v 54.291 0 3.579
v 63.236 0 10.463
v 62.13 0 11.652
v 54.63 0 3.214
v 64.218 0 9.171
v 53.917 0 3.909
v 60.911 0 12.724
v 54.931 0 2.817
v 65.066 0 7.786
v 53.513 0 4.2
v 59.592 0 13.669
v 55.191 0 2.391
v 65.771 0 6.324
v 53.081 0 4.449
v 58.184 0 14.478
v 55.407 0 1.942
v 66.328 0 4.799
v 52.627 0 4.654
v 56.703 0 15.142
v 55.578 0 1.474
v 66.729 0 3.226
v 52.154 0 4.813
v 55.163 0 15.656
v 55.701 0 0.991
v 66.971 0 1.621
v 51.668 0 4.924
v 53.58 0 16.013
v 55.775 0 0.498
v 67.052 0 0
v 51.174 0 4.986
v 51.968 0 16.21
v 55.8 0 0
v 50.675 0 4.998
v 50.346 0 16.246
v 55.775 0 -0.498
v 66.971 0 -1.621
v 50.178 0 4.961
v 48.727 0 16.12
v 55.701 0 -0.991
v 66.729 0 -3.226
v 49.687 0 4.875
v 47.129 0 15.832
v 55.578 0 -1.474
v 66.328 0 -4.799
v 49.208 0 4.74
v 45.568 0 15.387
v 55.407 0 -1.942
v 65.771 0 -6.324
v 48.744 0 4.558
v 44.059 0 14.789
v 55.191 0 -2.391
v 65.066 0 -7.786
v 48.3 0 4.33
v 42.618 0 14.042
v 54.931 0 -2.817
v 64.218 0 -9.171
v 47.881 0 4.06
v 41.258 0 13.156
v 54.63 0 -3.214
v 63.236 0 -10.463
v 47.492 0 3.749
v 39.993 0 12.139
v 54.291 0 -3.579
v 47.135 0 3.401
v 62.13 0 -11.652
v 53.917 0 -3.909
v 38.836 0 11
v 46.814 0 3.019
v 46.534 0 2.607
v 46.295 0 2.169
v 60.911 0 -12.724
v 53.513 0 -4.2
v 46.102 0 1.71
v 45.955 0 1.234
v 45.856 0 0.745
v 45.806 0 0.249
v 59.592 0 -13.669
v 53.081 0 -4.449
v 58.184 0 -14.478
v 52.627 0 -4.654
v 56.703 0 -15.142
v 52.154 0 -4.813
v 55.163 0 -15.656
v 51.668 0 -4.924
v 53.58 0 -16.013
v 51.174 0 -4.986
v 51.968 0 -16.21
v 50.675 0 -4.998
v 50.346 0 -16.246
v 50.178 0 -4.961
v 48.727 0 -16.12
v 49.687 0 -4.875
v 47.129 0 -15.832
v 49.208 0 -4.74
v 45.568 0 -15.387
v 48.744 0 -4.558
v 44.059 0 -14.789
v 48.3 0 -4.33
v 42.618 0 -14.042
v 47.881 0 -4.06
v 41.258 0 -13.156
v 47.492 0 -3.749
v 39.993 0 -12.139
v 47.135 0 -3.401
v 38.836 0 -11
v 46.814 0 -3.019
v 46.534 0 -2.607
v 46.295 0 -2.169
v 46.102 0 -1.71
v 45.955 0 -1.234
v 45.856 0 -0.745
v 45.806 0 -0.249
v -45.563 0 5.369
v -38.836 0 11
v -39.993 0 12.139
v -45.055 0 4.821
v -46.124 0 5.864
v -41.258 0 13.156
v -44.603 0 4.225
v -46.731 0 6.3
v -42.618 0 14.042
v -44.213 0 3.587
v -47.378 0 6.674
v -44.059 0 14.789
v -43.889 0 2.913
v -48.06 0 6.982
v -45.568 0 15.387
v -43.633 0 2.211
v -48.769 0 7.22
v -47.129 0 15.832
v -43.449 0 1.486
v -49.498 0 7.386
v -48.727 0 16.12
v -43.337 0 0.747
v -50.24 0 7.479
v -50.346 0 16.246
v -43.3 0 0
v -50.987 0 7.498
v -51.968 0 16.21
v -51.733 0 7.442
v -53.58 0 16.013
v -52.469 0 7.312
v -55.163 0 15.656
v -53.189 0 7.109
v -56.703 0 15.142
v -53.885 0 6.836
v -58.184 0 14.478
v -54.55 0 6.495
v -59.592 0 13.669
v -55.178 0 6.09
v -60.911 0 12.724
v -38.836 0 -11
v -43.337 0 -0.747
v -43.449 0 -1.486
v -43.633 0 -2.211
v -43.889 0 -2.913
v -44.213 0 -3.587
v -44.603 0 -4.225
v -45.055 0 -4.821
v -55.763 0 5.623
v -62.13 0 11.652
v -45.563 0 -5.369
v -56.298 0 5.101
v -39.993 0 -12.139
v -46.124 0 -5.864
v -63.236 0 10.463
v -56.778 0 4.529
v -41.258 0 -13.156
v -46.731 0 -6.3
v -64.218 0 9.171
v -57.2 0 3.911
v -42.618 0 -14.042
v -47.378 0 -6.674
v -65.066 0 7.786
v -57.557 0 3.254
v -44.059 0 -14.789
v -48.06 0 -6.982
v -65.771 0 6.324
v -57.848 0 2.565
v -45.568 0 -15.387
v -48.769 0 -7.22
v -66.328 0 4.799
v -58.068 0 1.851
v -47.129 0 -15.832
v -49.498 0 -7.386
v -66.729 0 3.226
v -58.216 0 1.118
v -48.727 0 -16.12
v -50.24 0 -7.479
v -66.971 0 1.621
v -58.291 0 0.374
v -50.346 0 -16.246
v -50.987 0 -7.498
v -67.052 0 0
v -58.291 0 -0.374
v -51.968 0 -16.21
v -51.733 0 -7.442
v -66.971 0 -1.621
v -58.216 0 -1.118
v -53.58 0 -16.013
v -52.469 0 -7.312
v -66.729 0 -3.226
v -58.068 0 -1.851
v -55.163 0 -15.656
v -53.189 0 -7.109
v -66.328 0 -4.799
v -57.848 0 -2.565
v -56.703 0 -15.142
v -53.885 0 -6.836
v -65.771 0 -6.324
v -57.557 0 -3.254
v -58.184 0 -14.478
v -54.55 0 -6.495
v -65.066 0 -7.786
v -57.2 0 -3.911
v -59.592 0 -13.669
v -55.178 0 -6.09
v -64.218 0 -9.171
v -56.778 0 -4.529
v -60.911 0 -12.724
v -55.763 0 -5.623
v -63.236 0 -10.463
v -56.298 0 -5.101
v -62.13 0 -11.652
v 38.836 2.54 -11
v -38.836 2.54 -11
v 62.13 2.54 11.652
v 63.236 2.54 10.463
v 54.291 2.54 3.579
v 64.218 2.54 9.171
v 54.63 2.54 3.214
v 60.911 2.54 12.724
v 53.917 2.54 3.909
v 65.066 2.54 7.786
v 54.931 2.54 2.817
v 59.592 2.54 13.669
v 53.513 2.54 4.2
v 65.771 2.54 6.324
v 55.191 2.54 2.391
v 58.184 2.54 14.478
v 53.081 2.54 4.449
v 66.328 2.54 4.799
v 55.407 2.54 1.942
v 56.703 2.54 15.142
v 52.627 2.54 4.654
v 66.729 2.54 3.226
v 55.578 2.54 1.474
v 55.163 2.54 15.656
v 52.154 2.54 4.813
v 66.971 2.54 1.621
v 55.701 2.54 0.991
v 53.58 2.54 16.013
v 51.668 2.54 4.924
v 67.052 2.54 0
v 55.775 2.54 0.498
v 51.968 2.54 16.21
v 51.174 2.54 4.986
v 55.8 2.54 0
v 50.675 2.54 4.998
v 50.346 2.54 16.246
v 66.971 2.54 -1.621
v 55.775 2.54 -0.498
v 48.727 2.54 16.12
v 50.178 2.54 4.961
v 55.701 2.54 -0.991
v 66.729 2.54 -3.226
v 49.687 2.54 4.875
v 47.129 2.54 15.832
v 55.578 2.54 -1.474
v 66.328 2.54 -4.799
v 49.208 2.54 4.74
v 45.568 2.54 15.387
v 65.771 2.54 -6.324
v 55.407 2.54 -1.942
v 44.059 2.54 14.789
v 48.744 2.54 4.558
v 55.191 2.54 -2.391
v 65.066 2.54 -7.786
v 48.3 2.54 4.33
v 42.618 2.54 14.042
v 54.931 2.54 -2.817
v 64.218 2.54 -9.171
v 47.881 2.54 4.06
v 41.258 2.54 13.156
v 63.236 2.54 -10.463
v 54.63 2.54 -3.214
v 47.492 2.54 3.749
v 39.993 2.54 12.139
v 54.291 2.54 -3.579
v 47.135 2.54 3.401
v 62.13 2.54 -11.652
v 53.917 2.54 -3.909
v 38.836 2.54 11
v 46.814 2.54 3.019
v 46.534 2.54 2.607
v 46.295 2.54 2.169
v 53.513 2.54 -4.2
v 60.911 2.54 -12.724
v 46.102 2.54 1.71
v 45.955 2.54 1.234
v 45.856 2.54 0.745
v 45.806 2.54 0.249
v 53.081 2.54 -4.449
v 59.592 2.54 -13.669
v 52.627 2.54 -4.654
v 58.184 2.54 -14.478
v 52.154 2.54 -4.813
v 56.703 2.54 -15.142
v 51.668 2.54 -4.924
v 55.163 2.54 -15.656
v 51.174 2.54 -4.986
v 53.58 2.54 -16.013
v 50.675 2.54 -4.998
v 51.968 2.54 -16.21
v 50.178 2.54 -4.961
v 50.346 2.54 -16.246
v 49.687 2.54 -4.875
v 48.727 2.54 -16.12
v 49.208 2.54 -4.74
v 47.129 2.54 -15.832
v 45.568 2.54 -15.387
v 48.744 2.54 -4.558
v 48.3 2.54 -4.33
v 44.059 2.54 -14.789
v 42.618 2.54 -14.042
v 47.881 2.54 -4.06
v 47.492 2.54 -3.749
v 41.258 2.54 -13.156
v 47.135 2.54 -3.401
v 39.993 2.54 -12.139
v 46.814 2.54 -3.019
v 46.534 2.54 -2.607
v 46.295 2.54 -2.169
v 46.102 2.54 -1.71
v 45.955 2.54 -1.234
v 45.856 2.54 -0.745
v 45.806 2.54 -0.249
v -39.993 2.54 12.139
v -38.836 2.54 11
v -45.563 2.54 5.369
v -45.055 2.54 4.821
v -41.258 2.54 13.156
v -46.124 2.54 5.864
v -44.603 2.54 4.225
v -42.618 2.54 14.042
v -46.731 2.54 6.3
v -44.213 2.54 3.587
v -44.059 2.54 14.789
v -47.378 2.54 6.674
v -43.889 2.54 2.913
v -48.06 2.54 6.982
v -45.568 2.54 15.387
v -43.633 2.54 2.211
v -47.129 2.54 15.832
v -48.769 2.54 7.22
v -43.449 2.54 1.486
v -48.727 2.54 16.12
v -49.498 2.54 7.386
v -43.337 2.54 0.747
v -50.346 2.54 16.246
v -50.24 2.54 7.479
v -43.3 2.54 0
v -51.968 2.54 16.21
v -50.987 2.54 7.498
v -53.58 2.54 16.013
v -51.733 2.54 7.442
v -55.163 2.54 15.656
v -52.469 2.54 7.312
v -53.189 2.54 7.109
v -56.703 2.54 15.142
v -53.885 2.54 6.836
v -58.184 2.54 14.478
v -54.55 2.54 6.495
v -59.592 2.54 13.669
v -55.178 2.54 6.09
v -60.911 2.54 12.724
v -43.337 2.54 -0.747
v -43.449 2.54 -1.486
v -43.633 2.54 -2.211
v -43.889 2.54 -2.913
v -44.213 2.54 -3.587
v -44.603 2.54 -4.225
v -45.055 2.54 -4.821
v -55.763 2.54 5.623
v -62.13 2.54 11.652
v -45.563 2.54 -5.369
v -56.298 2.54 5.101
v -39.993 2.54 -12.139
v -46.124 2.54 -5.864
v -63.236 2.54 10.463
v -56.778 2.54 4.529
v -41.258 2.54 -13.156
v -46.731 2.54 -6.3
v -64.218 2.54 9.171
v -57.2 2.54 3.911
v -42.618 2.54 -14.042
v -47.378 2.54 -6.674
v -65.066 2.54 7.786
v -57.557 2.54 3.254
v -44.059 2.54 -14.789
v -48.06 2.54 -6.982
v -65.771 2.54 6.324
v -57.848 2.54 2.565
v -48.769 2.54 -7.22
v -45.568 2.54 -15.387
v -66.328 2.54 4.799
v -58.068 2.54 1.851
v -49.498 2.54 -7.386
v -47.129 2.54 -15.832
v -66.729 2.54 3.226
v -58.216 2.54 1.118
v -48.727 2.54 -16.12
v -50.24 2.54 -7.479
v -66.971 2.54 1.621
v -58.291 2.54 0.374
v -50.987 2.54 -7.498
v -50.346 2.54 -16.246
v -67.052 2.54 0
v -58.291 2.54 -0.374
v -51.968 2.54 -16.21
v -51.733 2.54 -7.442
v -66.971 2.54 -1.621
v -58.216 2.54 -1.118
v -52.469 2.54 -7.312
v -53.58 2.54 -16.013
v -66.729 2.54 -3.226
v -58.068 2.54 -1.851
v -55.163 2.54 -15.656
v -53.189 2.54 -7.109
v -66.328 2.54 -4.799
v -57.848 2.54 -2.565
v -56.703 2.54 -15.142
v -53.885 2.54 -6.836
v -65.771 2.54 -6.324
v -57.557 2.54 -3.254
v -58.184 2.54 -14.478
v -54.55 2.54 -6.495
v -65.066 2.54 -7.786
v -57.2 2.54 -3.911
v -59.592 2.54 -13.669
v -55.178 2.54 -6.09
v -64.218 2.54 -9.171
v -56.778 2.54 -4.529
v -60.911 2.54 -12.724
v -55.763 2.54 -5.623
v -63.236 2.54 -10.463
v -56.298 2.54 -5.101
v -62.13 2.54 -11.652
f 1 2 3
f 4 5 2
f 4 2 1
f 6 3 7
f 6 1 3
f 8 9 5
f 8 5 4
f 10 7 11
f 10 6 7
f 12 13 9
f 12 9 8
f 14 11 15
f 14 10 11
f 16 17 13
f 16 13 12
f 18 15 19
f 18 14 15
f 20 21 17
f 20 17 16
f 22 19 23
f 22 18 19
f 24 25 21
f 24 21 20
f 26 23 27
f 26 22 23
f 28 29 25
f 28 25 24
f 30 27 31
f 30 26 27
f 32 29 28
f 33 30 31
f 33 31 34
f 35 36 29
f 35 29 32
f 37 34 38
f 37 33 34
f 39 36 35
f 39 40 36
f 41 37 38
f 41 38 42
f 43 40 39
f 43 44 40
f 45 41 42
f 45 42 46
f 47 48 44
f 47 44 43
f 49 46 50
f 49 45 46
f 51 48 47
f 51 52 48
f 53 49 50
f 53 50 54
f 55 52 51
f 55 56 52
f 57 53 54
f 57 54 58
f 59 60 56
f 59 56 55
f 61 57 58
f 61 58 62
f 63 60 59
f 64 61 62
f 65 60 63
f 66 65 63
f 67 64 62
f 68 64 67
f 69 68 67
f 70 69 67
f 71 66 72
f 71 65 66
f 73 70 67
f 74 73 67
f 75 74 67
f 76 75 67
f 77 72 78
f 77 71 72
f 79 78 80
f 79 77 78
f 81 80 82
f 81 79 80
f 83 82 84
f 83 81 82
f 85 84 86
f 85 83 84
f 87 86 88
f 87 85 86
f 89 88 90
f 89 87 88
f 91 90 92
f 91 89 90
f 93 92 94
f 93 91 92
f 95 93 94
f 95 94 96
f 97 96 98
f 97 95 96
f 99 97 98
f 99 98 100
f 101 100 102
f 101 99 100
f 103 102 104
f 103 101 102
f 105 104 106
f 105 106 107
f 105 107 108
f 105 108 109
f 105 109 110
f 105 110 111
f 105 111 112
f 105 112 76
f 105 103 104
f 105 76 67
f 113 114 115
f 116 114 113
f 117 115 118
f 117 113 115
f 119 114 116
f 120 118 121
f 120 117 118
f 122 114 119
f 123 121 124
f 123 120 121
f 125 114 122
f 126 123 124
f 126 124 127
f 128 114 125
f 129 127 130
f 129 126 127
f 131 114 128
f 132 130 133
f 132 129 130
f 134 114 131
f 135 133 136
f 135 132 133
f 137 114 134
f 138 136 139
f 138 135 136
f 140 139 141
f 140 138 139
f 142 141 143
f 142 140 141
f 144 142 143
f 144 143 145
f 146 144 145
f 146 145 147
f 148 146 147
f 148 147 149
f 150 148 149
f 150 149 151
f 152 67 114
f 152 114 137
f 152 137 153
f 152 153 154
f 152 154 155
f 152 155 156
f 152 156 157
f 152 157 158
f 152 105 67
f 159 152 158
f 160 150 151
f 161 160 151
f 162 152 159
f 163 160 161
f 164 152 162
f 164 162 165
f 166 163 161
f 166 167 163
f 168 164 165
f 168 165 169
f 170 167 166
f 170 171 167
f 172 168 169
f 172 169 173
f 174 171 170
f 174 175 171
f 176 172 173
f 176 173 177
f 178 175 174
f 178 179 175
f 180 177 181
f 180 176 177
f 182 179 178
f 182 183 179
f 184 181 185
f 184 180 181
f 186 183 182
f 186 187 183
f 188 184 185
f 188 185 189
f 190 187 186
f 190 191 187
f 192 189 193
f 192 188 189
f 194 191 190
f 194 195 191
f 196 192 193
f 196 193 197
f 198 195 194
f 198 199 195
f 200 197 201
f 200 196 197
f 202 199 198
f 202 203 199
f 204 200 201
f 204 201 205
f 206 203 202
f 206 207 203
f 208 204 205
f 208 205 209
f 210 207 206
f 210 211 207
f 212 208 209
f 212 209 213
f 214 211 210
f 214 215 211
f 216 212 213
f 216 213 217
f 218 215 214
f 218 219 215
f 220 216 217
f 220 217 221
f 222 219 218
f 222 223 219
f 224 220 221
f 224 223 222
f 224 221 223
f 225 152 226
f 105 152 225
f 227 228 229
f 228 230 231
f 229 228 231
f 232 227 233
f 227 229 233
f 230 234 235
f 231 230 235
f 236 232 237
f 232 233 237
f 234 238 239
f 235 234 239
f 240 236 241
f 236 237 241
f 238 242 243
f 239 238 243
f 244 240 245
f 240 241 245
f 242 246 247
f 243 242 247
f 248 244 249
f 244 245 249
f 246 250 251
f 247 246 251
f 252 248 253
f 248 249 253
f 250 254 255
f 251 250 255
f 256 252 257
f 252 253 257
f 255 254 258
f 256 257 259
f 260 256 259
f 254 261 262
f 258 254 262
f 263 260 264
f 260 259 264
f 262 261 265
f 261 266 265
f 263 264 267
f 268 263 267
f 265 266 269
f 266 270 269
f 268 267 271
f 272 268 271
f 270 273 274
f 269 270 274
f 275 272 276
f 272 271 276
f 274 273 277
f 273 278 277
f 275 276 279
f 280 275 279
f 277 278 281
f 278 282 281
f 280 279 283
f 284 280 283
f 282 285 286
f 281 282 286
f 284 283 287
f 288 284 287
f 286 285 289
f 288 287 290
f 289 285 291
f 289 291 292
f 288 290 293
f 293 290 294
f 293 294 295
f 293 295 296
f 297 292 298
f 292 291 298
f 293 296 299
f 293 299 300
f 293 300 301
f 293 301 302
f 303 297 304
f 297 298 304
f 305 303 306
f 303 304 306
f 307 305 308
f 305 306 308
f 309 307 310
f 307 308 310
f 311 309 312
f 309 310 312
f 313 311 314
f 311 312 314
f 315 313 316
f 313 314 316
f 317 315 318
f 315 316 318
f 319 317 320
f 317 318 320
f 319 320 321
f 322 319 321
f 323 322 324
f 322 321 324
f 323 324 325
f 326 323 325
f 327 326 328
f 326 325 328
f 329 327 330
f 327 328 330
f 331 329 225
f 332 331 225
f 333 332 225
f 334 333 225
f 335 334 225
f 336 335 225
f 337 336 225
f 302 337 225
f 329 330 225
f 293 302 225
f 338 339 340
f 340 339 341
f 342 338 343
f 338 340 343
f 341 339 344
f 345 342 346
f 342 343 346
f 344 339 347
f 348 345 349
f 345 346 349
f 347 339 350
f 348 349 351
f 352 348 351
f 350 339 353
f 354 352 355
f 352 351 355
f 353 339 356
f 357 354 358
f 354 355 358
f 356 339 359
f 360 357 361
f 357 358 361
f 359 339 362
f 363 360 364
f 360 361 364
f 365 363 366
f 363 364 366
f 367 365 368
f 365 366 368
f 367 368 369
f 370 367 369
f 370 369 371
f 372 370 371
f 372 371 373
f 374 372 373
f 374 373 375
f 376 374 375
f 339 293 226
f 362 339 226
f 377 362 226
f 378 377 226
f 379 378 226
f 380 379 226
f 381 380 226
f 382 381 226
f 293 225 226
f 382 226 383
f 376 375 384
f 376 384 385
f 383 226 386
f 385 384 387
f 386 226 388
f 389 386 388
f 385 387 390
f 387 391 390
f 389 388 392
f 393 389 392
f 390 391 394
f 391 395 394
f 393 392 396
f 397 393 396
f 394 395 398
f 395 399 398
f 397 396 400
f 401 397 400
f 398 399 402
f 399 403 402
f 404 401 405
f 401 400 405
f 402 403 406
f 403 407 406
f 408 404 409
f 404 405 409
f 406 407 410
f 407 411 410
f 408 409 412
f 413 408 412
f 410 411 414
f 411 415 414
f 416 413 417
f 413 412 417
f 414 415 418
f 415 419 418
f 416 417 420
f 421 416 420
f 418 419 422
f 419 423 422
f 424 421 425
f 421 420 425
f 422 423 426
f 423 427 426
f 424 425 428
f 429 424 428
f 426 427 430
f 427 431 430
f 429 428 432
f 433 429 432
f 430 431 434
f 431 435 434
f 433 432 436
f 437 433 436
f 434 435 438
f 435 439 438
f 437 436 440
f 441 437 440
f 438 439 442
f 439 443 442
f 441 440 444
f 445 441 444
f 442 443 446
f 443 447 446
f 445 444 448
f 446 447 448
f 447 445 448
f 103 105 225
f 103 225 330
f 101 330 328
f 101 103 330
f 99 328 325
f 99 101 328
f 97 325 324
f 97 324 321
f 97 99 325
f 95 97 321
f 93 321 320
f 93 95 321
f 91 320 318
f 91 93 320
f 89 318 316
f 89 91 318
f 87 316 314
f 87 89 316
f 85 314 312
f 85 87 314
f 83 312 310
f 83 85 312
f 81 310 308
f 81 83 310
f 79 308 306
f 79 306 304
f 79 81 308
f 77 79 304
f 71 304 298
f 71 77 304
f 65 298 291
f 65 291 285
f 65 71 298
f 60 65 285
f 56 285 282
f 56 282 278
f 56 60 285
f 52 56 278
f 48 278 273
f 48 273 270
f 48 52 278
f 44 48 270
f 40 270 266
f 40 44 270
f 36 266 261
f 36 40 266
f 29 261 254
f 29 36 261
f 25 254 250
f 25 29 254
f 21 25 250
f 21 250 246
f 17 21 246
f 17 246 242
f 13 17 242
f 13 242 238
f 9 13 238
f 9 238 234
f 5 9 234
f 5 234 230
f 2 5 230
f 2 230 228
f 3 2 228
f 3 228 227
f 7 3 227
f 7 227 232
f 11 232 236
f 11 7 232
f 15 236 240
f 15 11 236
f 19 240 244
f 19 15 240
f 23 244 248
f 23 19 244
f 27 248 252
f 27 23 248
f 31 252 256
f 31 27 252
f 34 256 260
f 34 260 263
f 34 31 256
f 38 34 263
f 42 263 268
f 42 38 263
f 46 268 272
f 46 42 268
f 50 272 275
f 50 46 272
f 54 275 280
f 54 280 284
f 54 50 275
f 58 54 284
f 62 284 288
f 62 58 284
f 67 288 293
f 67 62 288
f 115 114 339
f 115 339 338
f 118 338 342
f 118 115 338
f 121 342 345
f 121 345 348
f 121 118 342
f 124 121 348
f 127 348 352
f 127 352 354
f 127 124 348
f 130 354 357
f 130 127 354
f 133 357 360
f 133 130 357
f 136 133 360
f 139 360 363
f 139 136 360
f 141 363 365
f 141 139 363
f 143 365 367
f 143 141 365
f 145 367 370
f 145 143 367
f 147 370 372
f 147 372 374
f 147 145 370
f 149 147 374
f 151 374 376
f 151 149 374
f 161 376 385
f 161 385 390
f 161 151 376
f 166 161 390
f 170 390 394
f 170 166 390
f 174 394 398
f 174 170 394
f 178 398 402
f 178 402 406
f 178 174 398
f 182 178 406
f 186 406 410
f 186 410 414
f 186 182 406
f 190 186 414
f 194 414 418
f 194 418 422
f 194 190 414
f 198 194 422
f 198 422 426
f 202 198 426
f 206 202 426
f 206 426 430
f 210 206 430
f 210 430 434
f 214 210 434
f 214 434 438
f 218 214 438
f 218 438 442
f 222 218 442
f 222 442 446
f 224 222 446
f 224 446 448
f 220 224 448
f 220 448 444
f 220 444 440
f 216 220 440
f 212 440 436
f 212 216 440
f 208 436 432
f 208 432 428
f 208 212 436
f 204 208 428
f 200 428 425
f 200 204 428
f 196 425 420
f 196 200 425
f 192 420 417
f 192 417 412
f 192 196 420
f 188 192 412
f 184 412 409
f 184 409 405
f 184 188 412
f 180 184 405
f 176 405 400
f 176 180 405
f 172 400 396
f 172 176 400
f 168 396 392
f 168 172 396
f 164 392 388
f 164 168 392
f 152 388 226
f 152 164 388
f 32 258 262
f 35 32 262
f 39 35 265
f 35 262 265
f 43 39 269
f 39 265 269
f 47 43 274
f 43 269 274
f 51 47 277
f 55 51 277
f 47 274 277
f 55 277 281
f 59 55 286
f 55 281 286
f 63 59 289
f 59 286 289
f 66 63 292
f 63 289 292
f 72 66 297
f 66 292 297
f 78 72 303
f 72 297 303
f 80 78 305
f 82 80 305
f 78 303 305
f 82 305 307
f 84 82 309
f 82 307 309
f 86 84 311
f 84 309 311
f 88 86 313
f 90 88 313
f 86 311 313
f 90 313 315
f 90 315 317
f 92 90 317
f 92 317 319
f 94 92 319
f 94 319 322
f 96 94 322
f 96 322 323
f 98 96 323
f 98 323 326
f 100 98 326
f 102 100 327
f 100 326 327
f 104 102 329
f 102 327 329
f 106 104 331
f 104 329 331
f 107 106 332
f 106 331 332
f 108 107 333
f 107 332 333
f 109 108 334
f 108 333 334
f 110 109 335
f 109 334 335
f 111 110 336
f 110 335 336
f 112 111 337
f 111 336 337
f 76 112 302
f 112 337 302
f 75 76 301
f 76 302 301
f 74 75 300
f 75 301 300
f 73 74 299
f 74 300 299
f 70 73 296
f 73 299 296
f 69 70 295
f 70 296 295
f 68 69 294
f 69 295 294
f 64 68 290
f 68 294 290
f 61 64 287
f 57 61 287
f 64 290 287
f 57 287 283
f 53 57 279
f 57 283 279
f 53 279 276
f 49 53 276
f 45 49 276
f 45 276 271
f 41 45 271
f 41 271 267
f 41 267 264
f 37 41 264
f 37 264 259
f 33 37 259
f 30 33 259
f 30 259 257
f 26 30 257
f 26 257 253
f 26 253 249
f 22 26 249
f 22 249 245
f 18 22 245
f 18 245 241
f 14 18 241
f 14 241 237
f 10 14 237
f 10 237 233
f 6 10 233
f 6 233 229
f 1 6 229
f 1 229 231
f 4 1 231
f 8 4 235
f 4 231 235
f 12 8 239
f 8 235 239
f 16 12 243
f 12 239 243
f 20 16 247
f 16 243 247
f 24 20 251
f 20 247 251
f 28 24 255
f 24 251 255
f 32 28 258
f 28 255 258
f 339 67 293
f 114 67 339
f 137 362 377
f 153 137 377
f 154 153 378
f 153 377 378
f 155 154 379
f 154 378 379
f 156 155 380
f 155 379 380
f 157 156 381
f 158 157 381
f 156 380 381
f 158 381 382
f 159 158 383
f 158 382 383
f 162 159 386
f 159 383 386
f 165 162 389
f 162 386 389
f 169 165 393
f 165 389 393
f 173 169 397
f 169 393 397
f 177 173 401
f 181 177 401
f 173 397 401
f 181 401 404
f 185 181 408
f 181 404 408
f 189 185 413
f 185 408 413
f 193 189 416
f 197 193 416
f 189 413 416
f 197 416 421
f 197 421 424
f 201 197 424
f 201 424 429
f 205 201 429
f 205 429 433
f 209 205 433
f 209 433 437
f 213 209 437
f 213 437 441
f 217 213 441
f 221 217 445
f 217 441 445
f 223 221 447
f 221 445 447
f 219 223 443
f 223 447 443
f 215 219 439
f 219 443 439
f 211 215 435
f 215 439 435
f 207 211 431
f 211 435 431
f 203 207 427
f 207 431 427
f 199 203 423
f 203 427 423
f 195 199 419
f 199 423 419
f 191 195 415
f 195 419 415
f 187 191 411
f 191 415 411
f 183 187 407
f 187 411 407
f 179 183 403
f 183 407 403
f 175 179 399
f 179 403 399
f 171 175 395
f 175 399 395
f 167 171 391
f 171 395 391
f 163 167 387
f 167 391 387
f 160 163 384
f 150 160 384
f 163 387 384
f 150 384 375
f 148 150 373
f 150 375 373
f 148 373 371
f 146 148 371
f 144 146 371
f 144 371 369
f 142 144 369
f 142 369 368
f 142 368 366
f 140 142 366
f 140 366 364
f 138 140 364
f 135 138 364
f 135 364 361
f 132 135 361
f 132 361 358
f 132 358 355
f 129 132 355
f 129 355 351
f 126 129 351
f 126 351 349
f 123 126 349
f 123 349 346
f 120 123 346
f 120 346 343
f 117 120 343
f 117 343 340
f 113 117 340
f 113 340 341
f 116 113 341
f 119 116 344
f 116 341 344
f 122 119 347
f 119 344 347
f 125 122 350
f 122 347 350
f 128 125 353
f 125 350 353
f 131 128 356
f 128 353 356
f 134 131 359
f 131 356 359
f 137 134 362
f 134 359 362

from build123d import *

# Parameters (mm, degrees)
BOSS_EXTRUDE1_DEPTH = 2.54
SKETCH2_R           = 7.5
SKETCH2_R_2         = 5
CUT_EXTRUDE1_DEPTH  = 2.54


with BuildPart() as part:
    # Sketch1 → Boss-Extrude1 (new body)
    with BuildSketch(Plane(origin=(0, 0, 0), x_dir=(1, 0, 0), z_dir=(0, 1, 0))):
        with BuildLine():
            Line((-38.836017724, 11), (38.836017598, 11))
            ThreePointArc((38.836017598, 11), (67.052288298, 0), (38.836017598, -11))
            Line((38.836017598, -11), (-38.836017724, -11))
            ThreePointArc((-38.836017724, -11), (-67.052288205, 0), (-38.836017724, 11))
        make_face()
    extrude(amount=BOSS_EXTRUDE1_DEPTH)

    # Sketch2 → Cut-Extrude1 (cut)
    with BuildSketch(Plane(origin=(0, 2.54, 0), x_dir=(1, 0, 0), z_dir=(0, 1, 0))):
        with Locations((-50.8, 0)):
            Circle(SKETCH2_R)
        with Locations((50.8, 0)):
            Circle(SKETCH2_R_2)
    extrude(amount=-CUT_EXTRUDE1_DEPTH, mode=Mode.SUBTRACT)


solid = part.part
